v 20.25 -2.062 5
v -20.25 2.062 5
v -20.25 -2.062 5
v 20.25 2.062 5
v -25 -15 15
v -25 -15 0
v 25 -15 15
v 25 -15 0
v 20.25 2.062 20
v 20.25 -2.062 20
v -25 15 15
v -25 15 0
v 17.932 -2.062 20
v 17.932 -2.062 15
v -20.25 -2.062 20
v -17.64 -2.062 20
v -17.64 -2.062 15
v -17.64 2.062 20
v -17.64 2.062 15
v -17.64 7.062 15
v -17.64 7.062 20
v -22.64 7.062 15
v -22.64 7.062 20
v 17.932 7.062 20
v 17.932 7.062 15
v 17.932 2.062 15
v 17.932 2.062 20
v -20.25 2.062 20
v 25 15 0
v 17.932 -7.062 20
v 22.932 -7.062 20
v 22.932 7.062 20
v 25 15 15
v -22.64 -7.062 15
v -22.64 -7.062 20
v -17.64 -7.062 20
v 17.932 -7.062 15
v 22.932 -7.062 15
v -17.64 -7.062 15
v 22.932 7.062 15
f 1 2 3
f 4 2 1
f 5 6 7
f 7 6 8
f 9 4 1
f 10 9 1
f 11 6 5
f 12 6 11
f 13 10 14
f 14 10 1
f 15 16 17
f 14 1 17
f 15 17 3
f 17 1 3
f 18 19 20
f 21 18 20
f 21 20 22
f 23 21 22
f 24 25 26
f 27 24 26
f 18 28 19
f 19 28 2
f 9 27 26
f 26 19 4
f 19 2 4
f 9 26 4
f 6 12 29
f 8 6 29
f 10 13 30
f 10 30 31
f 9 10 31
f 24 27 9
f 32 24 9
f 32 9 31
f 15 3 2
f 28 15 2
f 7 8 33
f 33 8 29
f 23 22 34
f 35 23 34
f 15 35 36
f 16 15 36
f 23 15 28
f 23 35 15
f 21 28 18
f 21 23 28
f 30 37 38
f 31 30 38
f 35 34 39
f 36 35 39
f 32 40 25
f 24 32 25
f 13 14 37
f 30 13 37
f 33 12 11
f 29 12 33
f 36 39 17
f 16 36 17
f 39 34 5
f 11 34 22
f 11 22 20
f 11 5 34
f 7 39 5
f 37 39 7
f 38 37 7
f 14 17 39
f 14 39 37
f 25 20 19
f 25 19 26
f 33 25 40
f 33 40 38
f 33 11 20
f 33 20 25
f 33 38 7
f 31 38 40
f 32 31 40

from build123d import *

# Parameters (mm, degrees)
F1_DEPTH = 5
F0_W     = 50
F0_H     = 30
F2_DEPTH = 15
F3_DEPTH = 20


with BuildPart() as f1:
    # F0 (on Top) → F1 (new body)
    with BuildSketch(Plane.XY):
        Polygon((17.932241, -2.0625), (20.25, -2.0625), (20.25, 2.0625), (17.932241, 2.0625), (-17.639818, 2.0625), (-20.25, 2.0625), (-20.25, -2.0625), (-17.639818, -2.0625), align=None)
    extrude(amount=F1_DEPTH)

    # F0 (on Top) → F2 (join)
    with BuildSketch(Plane.XY):
        Rectangle(F0_W, F0_H)
        Polygon((17.932241, -7.0625), (17.932241, -2.0625), (-17.639818, -2.0625), (-17.639818, -7.0625), (-22.639818, -7.0625), (-22.639818, 7.0625), (-17.639818, 7.0625), (-17.639818, 2.0625), (17.932241, 2.0625), (17.932241, 7.0625), (22.932241, 7.0625), (22.932241, -7.0625), align=None, mode=Mode.SUBTRACT)
    extrude(amount=F2_DEPTH)

    # F0 (on Top) → F3 (join)
    with BuildSketch(Plane.XY):
        Polygon((-17.639818, -7.0625), (-17.639818, -2.0625), (-20.25, -2.0625), (-20.25, 2.0625), (-17.639818, 2.0625), (-17.639818, 7.0625), (-22.639818, 7.0625), (-22.639818, -7.0625), align=None)
        Polygon((20.25, 2.0625), (20.25, -2.0625), (17.932241, -2.0625), (17.932241, -7.0625), (22.932241, -7.0625), (22.932241, 7.0625), (17.932241, 7.0625), (17.932241, 2.0625), align=None)
    extrude(amount=F3_DEPTH)


solid = f1.part
